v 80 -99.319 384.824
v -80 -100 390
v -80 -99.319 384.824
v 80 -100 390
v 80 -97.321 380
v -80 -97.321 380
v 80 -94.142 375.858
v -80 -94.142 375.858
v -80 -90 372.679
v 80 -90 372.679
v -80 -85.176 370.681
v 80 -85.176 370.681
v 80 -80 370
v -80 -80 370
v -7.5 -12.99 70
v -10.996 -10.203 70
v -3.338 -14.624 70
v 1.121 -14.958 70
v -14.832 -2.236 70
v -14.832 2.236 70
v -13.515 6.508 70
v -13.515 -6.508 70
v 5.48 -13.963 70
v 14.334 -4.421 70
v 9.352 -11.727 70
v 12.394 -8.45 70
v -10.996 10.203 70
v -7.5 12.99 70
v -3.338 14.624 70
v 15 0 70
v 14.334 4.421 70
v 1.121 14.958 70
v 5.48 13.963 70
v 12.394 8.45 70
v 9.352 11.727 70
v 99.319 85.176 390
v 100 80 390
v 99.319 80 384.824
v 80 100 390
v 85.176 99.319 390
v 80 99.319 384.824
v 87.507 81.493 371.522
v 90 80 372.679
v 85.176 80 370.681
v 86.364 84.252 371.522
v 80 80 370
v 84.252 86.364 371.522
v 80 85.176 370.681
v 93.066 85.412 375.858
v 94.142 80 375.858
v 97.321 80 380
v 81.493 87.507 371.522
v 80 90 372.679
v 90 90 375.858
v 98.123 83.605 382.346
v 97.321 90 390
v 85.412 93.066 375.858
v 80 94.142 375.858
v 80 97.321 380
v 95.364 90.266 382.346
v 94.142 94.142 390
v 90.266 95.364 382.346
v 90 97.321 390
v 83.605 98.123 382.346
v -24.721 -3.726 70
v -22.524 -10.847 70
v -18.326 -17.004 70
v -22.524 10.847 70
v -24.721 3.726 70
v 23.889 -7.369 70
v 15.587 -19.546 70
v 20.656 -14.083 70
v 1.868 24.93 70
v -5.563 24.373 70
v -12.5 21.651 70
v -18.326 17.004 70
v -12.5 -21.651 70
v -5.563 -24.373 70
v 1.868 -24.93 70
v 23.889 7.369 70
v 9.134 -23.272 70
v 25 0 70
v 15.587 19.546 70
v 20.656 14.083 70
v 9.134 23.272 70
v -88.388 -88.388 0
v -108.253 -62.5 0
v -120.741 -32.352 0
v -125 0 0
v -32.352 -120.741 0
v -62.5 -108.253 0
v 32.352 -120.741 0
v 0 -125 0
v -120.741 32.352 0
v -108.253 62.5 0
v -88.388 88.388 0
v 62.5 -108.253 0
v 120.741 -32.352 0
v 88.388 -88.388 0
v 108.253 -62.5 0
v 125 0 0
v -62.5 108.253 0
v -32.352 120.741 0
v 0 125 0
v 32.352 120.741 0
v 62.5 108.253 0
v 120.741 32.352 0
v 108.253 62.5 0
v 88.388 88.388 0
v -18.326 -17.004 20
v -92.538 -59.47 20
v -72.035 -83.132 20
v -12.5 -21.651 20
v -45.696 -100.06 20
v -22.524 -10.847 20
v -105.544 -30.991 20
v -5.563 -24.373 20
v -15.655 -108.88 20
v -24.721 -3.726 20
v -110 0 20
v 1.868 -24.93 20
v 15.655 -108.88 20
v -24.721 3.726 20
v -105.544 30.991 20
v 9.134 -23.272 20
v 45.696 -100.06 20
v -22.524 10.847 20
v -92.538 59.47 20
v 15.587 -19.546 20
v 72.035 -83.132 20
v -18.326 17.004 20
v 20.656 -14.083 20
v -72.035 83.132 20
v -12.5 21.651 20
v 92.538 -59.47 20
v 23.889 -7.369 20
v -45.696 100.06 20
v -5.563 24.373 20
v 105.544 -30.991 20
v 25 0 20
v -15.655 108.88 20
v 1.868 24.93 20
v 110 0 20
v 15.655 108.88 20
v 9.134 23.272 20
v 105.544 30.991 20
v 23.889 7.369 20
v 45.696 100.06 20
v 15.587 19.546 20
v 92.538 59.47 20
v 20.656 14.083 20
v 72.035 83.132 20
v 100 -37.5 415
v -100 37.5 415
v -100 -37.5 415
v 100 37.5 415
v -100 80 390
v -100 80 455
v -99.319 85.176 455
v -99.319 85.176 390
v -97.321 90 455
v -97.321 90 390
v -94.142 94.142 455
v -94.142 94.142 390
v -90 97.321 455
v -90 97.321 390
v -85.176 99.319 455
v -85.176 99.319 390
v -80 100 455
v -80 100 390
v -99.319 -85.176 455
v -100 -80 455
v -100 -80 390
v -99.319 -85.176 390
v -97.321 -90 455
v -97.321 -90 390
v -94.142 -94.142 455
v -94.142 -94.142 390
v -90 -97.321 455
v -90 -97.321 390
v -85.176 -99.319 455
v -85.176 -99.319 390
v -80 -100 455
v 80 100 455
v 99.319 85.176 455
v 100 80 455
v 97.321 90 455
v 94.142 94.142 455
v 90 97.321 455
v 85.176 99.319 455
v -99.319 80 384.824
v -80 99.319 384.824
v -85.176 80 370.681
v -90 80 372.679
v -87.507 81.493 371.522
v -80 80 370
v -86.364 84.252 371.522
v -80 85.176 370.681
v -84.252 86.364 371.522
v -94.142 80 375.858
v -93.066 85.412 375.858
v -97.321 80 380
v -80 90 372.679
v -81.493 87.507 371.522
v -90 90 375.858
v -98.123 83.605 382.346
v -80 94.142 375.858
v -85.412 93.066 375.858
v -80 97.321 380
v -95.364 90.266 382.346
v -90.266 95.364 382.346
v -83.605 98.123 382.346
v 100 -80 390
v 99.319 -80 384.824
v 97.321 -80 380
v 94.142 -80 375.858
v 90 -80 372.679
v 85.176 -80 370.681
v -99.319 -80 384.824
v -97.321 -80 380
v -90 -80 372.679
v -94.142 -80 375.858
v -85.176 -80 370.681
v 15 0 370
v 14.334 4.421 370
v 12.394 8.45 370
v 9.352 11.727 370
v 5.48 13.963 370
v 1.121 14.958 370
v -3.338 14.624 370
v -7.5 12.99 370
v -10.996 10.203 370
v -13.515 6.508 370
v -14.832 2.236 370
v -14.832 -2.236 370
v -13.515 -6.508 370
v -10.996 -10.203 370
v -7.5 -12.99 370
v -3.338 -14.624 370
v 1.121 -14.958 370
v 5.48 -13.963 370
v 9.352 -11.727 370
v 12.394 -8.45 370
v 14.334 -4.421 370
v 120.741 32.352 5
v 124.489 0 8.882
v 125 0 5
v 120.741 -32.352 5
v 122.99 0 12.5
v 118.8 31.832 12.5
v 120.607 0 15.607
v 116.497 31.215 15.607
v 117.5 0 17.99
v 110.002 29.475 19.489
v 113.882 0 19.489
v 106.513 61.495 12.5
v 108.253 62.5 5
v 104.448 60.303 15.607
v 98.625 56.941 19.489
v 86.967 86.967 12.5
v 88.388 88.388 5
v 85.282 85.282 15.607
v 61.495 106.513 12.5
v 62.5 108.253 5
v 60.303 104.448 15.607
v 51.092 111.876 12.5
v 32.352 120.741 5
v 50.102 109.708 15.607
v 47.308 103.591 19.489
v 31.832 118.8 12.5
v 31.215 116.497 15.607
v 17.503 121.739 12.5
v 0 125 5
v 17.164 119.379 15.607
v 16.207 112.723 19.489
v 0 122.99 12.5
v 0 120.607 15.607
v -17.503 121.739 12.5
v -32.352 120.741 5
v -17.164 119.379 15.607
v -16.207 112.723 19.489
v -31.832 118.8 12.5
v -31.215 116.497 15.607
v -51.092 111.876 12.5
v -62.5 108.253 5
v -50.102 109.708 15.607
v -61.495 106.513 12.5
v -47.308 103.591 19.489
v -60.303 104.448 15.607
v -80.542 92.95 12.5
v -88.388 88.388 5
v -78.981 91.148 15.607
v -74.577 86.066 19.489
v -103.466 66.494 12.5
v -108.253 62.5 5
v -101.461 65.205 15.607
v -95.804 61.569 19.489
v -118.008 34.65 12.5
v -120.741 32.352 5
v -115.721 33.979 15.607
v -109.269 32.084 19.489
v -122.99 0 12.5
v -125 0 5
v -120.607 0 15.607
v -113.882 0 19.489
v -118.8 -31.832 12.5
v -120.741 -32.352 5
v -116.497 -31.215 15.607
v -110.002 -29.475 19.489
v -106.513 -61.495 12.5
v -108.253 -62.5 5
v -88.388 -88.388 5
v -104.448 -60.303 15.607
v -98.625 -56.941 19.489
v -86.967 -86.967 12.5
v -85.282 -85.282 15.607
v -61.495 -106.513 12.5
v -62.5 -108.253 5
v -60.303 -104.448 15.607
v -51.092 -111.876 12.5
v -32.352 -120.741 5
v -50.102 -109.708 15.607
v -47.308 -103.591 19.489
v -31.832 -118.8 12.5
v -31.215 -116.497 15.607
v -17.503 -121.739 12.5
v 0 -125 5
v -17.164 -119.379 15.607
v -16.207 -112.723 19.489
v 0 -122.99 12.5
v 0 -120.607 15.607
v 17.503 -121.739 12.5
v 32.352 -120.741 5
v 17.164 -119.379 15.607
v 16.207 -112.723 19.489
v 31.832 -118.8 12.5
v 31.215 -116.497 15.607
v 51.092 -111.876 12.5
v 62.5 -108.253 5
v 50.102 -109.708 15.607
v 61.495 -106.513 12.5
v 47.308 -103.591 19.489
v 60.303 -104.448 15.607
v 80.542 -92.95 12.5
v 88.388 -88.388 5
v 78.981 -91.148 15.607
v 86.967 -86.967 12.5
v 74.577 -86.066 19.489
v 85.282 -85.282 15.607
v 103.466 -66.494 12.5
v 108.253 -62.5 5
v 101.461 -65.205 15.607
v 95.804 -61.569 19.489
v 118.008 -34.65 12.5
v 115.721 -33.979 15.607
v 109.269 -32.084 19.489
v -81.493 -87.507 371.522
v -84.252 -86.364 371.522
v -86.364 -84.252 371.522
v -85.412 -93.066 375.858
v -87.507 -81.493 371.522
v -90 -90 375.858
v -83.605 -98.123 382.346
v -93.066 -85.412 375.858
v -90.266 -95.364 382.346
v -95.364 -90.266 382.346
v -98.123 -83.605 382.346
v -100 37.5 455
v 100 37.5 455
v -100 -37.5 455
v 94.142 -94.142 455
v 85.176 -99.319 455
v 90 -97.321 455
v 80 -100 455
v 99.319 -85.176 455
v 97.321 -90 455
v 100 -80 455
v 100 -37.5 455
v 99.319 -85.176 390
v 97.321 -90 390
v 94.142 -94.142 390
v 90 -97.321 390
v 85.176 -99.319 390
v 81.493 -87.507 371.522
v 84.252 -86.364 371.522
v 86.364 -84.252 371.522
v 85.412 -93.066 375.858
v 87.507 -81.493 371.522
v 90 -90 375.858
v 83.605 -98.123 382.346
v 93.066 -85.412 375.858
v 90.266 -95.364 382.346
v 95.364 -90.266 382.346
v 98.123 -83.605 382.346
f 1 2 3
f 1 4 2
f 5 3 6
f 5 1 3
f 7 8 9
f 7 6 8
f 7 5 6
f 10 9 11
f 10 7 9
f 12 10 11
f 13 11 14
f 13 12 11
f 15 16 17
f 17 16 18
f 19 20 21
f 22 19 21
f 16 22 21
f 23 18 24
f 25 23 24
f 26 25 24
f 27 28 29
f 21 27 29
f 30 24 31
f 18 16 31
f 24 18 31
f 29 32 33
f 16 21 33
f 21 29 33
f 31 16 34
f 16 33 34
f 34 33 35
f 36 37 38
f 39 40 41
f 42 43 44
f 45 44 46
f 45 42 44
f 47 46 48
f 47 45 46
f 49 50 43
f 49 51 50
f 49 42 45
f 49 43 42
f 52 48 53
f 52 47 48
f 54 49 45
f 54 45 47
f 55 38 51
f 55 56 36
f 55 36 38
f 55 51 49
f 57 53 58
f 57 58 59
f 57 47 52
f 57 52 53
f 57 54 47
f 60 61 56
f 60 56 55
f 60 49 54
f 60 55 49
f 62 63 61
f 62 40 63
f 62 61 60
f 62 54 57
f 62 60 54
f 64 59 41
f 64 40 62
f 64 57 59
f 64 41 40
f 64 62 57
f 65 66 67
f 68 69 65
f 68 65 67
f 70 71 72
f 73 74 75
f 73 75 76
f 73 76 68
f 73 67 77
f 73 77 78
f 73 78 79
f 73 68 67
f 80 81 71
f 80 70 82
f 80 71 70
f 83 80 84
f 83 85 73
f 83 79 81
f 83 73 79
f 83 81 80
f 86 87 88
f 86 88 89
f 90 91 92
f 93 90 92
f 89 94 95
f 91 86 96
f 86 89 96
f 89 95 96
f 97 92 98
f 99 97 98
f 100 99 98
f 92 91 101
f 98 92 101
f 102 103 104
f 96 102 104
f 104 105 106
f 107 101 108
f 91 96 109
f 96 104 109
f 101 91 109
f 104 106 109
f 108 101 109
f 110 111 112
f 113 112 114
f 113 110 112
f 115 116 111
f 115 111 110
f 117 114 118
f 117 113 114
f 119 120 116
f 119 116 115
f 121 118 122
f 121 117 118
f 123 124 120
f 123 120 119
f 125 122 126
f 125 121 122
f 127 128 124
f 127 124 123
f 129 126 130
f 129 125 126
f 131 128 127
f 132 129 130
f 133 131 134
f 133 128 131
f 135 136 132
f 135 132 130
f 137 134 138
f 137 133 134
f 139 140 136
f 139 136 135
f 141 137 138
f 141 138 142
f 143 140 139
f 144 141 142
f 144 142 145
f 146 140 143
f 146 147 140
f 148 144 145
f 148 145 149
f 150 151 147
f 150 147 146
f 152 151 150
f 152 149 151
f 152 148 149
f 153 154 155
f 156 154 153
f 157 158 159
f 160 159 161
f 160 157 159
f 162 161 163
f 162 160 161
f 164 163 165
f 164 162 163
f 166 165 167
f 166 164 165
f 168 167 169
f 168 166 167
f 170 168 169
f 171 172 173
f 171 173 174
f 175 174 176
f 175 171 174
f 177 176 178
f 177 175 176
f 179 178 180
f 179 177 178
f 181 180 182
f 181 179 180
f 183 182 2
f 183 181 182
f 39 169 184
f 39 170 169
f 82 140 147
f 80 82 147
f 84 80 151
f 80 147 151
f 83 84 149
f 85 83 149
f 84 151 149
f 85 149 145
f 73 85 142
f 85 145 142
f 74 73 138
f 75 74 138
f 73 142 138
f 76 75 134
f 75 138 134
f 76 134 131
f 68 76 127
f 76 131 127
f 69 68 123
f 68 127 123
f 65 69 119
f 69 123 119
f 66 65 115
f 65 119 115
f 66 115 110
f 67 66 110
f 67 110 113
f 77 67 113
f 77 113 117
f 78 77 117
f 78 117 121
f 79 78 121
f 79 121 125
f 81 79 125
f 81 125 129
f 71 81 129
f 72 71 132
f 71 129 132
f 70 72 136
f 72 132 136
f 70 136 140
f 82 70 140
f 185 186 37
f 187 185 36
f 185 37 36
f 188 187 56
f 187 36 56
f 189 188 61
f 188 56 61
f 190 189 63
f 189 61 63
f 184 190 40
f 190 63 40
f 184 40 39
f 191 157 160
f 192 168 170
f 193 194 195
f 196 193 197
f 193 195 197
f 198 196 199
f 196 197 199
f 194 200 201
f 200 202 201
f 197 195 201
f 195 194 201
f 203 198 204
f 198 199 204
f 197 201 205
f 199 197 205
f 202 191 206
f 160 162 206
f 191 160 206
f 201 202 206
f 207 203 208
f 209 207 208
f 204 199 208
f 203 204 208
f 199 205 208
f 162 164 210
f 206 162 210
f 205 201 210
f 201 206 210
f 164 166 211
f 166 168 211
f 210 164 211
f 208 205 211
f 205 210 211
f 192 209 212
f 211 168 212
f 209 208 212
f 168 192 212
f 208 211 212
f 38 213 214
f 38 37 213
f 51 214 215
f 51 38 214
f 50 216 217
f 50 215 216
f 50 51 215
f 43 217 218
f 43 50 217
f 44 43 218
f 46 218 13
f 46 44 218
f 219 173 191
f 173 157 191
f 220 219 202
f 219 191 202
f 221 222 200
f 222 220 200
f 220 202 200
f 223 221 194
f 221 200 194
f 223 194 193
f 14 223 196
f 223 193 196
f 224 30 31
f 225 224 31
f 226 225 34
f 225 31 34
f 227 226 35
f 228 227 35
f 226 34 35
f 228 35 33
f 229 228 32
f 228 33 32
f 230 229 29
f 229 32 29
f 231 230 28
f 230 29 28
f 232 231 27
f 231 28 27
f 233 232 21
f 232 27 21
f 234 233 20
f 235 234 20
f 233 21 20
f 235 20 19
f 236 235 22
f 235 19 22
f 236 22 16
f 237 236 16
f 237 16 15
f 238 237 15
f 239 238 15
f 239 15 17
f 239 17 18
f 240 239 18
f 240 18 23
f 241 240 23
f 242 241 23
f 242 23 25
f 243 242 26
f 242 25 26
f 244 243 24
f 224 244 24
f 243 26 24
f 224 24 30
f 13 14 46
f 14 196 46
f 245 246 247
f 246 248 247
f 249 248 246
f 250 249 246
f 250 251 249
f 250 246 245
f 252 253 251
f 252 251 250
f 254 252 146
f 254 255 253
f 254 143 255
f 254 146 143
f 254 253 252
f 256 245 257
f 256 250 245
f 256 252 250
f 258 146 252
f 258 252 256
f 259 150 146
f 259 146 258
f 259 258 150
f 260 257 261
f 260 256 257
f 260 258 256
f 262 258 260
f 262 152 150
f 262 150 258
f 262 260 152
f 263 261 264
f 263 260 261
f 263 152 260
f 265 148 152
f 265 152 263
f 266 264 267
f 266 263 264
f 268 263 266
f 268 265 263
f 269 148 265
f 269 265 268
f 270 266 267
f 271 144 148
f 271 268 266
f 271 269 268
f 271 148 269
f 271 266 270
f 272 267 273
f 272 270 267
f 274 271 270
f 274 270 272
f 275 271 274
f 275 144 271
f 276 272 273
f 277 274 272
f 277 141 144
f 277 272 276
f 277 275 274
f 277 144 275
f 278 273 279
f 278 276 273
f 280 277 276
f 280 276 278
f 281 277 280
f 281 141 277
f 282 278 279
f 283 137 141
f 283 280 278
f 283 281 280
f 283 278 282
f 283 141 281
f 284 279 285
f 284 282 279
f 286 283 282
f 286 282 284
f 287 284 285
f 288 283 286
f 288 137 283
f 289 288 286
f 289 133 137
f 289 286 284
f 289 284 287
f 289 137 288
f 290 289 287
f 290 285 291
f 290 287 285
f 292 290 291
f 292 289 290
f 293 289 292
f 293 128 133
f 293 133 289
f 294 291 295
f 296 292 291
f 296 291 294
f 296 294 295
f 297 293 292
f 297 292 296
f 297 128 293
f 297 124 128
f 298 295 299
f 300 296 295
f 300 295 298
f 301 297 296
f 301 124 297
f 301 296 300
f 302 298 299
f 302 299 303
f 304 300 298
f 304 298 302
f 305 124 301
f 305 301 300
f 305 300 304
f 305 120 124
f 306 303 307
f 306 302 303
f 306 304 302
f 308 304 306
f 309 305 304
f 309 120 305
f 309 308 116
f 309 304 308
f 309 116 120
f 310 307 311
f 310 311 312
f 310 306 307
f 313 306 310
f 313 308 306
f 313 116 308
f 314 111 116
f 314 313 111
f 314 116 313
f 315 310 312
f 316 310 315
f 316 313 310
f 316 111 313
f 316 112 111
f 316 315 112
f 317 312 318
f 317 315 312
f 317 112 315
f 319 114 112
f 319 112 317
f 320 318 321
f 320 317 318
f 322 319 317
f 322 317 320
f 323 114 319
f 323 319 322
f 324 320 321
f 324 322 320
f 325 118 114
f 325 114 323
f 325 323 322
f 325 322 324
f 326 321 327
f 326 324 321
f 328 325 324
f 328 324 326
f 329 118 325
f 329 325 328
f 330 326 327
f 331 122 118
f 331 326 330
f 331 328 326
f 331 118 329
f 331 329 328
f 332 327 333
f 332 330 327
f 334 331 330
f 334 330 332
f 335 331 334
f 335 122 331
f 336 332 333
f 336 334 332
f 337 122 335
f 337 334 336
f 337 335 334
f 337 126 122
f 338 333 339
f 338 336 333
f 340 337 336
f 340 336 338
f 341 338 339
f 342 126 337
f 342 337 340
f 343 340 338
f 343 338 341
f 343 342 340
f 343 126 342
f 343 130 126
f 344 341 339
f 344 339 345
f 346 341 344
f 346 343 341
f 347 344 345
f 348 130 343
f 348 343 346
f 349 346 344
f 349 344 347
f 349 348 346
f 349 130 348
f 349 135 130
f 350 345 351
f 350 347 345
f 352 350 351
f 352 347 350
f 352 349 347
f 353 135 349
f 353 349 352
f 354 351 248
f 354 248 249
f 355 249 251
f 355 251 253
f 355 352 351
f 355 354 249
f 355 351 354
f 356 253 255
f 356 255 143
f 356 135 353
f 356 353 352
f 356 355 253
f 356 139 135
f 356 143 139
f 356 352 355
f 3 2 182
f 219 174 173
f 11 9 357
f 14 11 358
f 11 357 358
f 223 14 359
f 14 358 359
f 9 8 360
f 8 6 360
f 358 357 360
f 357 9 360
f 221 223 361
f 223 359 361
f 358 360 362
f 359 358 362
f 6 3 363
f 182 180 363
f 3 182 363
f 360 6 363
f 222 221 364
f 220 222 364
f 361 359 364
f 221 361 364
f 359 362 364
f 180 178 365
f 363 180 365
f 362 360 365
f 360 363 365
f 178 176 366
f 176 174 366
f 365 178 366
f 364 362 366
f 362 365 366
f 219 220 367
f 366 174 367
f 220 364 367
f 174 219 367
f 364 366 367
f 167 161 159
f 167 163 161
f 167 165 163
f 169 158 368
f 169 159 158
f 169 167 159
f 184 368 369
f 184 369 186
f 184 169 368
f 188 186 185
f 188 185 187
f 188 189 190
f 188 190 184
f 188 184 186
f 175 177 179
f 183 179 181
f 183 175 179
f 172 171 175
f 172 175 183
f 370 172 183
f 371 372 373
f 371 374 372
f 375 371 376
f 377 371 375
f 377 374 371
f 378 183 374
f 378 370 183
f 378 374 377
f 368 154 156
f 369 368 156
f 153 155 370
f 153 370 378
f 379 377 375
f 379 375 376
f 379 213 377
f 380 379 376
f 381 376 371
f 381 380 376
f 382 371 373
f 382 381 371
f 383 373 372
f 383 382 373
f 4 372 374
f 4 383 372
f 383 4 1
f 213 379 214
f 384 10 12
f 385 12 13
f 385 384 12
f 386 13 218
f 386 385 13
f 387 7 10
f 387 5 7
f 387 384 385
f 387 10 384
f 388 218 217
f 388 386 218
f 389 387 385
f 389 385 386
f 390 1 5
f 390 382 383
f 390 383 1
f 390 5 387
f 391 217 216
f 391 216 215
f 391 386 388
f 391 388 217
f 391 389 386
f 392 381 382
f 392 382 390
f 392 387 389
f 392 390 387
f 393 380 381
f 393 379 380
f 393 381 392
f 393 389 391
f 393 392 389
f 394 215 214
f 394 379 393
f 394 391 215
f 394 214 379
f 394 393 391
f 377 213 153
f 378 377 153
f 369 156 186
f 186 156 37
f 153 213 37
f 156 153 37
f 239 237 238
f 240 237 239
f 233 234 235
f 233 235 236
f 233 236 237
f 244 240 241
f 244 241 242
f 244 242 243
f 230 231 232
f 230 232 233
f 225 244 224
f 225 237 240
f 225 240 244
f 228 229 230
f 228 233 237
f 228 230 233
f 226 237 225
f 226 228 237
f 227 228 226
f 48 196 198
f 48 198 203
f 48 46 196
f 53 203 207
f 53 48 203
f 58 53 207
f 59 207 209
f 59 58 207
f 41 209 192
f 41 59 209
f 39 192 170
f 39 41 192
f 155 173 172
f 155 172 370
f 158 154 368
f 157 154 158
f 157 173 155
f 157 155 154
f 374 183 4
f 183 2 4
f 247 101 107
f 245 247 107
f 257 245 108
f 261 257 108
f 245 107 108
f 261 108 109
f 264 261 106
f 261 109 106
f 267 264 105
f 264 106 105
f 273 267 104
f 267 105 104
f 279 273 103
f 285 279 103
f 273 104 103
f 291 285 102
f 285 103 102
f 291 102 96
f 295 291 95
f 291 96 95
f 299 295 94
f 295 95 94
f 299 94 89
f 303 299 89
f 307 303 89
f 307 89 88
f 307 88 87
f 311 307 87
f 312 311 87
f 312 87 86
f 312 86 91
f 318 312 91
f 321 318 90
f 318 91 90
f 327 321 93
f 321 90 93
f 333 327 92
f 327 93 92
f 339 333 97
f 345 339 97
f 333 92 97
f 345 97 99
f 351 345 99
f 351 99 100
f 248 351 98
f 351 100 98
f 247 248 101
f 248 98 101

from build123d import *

# Parameters (mm, degrees)
SKETCH_R     = 125
PAD_DEPTH    = 20
SKETCH001_R  = 25
PAD001_DEPTH = 50
FILLET006_R  = 15
SKETCH002_R  = 15
PAD002_DEPTH = 300
SKETCH003_W  = 200
SKETCH003_H  = 200
PAD003_DEPTH = 45
SKETCH009_W  = 200
SKETCH009_H  = 62.5
PAD009_DEPTH = 40
FILLET005_R  = 20


with BuildPart() as body1:
    # Sketch → Pad (new body)
    with BuildSketch(Plane.XY):
        Circle(SKETCH_R)
    extrude(amount=PAD_DEPTH)

    # Sketch001 (on Face3 of Pad) → Pad001 (join)
    with BuildSketch(Plane.XY.offset(20)):
        Circle(SKETCH001_R)
    extrude(amount=PAD001_DEPTH)

    # Fillet006
    fillet006_edges = [body1.edges().sort_by_distance(p)[0] for p in [
        (-125, 0, 20),
    ]]
    fillet(fillet006_edges, radius=FILLET006_R)


with BuildPart() as body2:
    # Sketch002 (on CopyPad) → Pad002 (new body)
    with BuildSketch(Plane.XY.offset(70)):
        Circle(SKETCH002_R)
    extrude(amount=PAD002_DEPTH)


with BuildPart() as body3:
    # Sketch003 (on Face1 of CopyPad002) → Pad003 (new body)
    with BuildSketch(Plane.XY.offset(370)):
        Rectangle(SKETCH003_W, SKETCH003_H)
    extrude(amount=PAD003_DEPTH)

    # Sketch009 (on Face6 of Pad003) → Pad009 (join)
    with BuildSketch(Plane.XY.offset(415)):
        with Locations((0, 68.75)):
            Rectangle(SKETCH009_W, SKETCH009_H)
        with Locations((0, -68.75)):
            Rectangle(SKETCH009_W, SKETCH009_H)
    extrude(amount=PAD009_DEPTH)

    # Fillet005
    fillet005_edges = [body3.edges().sort_by_distance(p)[0] for p in [
        (-100, -100, 412.5),
        (100, -100, 412.5),
        (100, 100, 412.5),
        (-100, 100, 412.5),
        (0, -100, 370),
        (100, 0, 370),
        (-100, 0, 370),
        (0, 100, 370),
    ]]
    fillet(fillet005_edges, radius=FILLET005_R)


solid = Compound([body1.part, body2.part, body3.part])
